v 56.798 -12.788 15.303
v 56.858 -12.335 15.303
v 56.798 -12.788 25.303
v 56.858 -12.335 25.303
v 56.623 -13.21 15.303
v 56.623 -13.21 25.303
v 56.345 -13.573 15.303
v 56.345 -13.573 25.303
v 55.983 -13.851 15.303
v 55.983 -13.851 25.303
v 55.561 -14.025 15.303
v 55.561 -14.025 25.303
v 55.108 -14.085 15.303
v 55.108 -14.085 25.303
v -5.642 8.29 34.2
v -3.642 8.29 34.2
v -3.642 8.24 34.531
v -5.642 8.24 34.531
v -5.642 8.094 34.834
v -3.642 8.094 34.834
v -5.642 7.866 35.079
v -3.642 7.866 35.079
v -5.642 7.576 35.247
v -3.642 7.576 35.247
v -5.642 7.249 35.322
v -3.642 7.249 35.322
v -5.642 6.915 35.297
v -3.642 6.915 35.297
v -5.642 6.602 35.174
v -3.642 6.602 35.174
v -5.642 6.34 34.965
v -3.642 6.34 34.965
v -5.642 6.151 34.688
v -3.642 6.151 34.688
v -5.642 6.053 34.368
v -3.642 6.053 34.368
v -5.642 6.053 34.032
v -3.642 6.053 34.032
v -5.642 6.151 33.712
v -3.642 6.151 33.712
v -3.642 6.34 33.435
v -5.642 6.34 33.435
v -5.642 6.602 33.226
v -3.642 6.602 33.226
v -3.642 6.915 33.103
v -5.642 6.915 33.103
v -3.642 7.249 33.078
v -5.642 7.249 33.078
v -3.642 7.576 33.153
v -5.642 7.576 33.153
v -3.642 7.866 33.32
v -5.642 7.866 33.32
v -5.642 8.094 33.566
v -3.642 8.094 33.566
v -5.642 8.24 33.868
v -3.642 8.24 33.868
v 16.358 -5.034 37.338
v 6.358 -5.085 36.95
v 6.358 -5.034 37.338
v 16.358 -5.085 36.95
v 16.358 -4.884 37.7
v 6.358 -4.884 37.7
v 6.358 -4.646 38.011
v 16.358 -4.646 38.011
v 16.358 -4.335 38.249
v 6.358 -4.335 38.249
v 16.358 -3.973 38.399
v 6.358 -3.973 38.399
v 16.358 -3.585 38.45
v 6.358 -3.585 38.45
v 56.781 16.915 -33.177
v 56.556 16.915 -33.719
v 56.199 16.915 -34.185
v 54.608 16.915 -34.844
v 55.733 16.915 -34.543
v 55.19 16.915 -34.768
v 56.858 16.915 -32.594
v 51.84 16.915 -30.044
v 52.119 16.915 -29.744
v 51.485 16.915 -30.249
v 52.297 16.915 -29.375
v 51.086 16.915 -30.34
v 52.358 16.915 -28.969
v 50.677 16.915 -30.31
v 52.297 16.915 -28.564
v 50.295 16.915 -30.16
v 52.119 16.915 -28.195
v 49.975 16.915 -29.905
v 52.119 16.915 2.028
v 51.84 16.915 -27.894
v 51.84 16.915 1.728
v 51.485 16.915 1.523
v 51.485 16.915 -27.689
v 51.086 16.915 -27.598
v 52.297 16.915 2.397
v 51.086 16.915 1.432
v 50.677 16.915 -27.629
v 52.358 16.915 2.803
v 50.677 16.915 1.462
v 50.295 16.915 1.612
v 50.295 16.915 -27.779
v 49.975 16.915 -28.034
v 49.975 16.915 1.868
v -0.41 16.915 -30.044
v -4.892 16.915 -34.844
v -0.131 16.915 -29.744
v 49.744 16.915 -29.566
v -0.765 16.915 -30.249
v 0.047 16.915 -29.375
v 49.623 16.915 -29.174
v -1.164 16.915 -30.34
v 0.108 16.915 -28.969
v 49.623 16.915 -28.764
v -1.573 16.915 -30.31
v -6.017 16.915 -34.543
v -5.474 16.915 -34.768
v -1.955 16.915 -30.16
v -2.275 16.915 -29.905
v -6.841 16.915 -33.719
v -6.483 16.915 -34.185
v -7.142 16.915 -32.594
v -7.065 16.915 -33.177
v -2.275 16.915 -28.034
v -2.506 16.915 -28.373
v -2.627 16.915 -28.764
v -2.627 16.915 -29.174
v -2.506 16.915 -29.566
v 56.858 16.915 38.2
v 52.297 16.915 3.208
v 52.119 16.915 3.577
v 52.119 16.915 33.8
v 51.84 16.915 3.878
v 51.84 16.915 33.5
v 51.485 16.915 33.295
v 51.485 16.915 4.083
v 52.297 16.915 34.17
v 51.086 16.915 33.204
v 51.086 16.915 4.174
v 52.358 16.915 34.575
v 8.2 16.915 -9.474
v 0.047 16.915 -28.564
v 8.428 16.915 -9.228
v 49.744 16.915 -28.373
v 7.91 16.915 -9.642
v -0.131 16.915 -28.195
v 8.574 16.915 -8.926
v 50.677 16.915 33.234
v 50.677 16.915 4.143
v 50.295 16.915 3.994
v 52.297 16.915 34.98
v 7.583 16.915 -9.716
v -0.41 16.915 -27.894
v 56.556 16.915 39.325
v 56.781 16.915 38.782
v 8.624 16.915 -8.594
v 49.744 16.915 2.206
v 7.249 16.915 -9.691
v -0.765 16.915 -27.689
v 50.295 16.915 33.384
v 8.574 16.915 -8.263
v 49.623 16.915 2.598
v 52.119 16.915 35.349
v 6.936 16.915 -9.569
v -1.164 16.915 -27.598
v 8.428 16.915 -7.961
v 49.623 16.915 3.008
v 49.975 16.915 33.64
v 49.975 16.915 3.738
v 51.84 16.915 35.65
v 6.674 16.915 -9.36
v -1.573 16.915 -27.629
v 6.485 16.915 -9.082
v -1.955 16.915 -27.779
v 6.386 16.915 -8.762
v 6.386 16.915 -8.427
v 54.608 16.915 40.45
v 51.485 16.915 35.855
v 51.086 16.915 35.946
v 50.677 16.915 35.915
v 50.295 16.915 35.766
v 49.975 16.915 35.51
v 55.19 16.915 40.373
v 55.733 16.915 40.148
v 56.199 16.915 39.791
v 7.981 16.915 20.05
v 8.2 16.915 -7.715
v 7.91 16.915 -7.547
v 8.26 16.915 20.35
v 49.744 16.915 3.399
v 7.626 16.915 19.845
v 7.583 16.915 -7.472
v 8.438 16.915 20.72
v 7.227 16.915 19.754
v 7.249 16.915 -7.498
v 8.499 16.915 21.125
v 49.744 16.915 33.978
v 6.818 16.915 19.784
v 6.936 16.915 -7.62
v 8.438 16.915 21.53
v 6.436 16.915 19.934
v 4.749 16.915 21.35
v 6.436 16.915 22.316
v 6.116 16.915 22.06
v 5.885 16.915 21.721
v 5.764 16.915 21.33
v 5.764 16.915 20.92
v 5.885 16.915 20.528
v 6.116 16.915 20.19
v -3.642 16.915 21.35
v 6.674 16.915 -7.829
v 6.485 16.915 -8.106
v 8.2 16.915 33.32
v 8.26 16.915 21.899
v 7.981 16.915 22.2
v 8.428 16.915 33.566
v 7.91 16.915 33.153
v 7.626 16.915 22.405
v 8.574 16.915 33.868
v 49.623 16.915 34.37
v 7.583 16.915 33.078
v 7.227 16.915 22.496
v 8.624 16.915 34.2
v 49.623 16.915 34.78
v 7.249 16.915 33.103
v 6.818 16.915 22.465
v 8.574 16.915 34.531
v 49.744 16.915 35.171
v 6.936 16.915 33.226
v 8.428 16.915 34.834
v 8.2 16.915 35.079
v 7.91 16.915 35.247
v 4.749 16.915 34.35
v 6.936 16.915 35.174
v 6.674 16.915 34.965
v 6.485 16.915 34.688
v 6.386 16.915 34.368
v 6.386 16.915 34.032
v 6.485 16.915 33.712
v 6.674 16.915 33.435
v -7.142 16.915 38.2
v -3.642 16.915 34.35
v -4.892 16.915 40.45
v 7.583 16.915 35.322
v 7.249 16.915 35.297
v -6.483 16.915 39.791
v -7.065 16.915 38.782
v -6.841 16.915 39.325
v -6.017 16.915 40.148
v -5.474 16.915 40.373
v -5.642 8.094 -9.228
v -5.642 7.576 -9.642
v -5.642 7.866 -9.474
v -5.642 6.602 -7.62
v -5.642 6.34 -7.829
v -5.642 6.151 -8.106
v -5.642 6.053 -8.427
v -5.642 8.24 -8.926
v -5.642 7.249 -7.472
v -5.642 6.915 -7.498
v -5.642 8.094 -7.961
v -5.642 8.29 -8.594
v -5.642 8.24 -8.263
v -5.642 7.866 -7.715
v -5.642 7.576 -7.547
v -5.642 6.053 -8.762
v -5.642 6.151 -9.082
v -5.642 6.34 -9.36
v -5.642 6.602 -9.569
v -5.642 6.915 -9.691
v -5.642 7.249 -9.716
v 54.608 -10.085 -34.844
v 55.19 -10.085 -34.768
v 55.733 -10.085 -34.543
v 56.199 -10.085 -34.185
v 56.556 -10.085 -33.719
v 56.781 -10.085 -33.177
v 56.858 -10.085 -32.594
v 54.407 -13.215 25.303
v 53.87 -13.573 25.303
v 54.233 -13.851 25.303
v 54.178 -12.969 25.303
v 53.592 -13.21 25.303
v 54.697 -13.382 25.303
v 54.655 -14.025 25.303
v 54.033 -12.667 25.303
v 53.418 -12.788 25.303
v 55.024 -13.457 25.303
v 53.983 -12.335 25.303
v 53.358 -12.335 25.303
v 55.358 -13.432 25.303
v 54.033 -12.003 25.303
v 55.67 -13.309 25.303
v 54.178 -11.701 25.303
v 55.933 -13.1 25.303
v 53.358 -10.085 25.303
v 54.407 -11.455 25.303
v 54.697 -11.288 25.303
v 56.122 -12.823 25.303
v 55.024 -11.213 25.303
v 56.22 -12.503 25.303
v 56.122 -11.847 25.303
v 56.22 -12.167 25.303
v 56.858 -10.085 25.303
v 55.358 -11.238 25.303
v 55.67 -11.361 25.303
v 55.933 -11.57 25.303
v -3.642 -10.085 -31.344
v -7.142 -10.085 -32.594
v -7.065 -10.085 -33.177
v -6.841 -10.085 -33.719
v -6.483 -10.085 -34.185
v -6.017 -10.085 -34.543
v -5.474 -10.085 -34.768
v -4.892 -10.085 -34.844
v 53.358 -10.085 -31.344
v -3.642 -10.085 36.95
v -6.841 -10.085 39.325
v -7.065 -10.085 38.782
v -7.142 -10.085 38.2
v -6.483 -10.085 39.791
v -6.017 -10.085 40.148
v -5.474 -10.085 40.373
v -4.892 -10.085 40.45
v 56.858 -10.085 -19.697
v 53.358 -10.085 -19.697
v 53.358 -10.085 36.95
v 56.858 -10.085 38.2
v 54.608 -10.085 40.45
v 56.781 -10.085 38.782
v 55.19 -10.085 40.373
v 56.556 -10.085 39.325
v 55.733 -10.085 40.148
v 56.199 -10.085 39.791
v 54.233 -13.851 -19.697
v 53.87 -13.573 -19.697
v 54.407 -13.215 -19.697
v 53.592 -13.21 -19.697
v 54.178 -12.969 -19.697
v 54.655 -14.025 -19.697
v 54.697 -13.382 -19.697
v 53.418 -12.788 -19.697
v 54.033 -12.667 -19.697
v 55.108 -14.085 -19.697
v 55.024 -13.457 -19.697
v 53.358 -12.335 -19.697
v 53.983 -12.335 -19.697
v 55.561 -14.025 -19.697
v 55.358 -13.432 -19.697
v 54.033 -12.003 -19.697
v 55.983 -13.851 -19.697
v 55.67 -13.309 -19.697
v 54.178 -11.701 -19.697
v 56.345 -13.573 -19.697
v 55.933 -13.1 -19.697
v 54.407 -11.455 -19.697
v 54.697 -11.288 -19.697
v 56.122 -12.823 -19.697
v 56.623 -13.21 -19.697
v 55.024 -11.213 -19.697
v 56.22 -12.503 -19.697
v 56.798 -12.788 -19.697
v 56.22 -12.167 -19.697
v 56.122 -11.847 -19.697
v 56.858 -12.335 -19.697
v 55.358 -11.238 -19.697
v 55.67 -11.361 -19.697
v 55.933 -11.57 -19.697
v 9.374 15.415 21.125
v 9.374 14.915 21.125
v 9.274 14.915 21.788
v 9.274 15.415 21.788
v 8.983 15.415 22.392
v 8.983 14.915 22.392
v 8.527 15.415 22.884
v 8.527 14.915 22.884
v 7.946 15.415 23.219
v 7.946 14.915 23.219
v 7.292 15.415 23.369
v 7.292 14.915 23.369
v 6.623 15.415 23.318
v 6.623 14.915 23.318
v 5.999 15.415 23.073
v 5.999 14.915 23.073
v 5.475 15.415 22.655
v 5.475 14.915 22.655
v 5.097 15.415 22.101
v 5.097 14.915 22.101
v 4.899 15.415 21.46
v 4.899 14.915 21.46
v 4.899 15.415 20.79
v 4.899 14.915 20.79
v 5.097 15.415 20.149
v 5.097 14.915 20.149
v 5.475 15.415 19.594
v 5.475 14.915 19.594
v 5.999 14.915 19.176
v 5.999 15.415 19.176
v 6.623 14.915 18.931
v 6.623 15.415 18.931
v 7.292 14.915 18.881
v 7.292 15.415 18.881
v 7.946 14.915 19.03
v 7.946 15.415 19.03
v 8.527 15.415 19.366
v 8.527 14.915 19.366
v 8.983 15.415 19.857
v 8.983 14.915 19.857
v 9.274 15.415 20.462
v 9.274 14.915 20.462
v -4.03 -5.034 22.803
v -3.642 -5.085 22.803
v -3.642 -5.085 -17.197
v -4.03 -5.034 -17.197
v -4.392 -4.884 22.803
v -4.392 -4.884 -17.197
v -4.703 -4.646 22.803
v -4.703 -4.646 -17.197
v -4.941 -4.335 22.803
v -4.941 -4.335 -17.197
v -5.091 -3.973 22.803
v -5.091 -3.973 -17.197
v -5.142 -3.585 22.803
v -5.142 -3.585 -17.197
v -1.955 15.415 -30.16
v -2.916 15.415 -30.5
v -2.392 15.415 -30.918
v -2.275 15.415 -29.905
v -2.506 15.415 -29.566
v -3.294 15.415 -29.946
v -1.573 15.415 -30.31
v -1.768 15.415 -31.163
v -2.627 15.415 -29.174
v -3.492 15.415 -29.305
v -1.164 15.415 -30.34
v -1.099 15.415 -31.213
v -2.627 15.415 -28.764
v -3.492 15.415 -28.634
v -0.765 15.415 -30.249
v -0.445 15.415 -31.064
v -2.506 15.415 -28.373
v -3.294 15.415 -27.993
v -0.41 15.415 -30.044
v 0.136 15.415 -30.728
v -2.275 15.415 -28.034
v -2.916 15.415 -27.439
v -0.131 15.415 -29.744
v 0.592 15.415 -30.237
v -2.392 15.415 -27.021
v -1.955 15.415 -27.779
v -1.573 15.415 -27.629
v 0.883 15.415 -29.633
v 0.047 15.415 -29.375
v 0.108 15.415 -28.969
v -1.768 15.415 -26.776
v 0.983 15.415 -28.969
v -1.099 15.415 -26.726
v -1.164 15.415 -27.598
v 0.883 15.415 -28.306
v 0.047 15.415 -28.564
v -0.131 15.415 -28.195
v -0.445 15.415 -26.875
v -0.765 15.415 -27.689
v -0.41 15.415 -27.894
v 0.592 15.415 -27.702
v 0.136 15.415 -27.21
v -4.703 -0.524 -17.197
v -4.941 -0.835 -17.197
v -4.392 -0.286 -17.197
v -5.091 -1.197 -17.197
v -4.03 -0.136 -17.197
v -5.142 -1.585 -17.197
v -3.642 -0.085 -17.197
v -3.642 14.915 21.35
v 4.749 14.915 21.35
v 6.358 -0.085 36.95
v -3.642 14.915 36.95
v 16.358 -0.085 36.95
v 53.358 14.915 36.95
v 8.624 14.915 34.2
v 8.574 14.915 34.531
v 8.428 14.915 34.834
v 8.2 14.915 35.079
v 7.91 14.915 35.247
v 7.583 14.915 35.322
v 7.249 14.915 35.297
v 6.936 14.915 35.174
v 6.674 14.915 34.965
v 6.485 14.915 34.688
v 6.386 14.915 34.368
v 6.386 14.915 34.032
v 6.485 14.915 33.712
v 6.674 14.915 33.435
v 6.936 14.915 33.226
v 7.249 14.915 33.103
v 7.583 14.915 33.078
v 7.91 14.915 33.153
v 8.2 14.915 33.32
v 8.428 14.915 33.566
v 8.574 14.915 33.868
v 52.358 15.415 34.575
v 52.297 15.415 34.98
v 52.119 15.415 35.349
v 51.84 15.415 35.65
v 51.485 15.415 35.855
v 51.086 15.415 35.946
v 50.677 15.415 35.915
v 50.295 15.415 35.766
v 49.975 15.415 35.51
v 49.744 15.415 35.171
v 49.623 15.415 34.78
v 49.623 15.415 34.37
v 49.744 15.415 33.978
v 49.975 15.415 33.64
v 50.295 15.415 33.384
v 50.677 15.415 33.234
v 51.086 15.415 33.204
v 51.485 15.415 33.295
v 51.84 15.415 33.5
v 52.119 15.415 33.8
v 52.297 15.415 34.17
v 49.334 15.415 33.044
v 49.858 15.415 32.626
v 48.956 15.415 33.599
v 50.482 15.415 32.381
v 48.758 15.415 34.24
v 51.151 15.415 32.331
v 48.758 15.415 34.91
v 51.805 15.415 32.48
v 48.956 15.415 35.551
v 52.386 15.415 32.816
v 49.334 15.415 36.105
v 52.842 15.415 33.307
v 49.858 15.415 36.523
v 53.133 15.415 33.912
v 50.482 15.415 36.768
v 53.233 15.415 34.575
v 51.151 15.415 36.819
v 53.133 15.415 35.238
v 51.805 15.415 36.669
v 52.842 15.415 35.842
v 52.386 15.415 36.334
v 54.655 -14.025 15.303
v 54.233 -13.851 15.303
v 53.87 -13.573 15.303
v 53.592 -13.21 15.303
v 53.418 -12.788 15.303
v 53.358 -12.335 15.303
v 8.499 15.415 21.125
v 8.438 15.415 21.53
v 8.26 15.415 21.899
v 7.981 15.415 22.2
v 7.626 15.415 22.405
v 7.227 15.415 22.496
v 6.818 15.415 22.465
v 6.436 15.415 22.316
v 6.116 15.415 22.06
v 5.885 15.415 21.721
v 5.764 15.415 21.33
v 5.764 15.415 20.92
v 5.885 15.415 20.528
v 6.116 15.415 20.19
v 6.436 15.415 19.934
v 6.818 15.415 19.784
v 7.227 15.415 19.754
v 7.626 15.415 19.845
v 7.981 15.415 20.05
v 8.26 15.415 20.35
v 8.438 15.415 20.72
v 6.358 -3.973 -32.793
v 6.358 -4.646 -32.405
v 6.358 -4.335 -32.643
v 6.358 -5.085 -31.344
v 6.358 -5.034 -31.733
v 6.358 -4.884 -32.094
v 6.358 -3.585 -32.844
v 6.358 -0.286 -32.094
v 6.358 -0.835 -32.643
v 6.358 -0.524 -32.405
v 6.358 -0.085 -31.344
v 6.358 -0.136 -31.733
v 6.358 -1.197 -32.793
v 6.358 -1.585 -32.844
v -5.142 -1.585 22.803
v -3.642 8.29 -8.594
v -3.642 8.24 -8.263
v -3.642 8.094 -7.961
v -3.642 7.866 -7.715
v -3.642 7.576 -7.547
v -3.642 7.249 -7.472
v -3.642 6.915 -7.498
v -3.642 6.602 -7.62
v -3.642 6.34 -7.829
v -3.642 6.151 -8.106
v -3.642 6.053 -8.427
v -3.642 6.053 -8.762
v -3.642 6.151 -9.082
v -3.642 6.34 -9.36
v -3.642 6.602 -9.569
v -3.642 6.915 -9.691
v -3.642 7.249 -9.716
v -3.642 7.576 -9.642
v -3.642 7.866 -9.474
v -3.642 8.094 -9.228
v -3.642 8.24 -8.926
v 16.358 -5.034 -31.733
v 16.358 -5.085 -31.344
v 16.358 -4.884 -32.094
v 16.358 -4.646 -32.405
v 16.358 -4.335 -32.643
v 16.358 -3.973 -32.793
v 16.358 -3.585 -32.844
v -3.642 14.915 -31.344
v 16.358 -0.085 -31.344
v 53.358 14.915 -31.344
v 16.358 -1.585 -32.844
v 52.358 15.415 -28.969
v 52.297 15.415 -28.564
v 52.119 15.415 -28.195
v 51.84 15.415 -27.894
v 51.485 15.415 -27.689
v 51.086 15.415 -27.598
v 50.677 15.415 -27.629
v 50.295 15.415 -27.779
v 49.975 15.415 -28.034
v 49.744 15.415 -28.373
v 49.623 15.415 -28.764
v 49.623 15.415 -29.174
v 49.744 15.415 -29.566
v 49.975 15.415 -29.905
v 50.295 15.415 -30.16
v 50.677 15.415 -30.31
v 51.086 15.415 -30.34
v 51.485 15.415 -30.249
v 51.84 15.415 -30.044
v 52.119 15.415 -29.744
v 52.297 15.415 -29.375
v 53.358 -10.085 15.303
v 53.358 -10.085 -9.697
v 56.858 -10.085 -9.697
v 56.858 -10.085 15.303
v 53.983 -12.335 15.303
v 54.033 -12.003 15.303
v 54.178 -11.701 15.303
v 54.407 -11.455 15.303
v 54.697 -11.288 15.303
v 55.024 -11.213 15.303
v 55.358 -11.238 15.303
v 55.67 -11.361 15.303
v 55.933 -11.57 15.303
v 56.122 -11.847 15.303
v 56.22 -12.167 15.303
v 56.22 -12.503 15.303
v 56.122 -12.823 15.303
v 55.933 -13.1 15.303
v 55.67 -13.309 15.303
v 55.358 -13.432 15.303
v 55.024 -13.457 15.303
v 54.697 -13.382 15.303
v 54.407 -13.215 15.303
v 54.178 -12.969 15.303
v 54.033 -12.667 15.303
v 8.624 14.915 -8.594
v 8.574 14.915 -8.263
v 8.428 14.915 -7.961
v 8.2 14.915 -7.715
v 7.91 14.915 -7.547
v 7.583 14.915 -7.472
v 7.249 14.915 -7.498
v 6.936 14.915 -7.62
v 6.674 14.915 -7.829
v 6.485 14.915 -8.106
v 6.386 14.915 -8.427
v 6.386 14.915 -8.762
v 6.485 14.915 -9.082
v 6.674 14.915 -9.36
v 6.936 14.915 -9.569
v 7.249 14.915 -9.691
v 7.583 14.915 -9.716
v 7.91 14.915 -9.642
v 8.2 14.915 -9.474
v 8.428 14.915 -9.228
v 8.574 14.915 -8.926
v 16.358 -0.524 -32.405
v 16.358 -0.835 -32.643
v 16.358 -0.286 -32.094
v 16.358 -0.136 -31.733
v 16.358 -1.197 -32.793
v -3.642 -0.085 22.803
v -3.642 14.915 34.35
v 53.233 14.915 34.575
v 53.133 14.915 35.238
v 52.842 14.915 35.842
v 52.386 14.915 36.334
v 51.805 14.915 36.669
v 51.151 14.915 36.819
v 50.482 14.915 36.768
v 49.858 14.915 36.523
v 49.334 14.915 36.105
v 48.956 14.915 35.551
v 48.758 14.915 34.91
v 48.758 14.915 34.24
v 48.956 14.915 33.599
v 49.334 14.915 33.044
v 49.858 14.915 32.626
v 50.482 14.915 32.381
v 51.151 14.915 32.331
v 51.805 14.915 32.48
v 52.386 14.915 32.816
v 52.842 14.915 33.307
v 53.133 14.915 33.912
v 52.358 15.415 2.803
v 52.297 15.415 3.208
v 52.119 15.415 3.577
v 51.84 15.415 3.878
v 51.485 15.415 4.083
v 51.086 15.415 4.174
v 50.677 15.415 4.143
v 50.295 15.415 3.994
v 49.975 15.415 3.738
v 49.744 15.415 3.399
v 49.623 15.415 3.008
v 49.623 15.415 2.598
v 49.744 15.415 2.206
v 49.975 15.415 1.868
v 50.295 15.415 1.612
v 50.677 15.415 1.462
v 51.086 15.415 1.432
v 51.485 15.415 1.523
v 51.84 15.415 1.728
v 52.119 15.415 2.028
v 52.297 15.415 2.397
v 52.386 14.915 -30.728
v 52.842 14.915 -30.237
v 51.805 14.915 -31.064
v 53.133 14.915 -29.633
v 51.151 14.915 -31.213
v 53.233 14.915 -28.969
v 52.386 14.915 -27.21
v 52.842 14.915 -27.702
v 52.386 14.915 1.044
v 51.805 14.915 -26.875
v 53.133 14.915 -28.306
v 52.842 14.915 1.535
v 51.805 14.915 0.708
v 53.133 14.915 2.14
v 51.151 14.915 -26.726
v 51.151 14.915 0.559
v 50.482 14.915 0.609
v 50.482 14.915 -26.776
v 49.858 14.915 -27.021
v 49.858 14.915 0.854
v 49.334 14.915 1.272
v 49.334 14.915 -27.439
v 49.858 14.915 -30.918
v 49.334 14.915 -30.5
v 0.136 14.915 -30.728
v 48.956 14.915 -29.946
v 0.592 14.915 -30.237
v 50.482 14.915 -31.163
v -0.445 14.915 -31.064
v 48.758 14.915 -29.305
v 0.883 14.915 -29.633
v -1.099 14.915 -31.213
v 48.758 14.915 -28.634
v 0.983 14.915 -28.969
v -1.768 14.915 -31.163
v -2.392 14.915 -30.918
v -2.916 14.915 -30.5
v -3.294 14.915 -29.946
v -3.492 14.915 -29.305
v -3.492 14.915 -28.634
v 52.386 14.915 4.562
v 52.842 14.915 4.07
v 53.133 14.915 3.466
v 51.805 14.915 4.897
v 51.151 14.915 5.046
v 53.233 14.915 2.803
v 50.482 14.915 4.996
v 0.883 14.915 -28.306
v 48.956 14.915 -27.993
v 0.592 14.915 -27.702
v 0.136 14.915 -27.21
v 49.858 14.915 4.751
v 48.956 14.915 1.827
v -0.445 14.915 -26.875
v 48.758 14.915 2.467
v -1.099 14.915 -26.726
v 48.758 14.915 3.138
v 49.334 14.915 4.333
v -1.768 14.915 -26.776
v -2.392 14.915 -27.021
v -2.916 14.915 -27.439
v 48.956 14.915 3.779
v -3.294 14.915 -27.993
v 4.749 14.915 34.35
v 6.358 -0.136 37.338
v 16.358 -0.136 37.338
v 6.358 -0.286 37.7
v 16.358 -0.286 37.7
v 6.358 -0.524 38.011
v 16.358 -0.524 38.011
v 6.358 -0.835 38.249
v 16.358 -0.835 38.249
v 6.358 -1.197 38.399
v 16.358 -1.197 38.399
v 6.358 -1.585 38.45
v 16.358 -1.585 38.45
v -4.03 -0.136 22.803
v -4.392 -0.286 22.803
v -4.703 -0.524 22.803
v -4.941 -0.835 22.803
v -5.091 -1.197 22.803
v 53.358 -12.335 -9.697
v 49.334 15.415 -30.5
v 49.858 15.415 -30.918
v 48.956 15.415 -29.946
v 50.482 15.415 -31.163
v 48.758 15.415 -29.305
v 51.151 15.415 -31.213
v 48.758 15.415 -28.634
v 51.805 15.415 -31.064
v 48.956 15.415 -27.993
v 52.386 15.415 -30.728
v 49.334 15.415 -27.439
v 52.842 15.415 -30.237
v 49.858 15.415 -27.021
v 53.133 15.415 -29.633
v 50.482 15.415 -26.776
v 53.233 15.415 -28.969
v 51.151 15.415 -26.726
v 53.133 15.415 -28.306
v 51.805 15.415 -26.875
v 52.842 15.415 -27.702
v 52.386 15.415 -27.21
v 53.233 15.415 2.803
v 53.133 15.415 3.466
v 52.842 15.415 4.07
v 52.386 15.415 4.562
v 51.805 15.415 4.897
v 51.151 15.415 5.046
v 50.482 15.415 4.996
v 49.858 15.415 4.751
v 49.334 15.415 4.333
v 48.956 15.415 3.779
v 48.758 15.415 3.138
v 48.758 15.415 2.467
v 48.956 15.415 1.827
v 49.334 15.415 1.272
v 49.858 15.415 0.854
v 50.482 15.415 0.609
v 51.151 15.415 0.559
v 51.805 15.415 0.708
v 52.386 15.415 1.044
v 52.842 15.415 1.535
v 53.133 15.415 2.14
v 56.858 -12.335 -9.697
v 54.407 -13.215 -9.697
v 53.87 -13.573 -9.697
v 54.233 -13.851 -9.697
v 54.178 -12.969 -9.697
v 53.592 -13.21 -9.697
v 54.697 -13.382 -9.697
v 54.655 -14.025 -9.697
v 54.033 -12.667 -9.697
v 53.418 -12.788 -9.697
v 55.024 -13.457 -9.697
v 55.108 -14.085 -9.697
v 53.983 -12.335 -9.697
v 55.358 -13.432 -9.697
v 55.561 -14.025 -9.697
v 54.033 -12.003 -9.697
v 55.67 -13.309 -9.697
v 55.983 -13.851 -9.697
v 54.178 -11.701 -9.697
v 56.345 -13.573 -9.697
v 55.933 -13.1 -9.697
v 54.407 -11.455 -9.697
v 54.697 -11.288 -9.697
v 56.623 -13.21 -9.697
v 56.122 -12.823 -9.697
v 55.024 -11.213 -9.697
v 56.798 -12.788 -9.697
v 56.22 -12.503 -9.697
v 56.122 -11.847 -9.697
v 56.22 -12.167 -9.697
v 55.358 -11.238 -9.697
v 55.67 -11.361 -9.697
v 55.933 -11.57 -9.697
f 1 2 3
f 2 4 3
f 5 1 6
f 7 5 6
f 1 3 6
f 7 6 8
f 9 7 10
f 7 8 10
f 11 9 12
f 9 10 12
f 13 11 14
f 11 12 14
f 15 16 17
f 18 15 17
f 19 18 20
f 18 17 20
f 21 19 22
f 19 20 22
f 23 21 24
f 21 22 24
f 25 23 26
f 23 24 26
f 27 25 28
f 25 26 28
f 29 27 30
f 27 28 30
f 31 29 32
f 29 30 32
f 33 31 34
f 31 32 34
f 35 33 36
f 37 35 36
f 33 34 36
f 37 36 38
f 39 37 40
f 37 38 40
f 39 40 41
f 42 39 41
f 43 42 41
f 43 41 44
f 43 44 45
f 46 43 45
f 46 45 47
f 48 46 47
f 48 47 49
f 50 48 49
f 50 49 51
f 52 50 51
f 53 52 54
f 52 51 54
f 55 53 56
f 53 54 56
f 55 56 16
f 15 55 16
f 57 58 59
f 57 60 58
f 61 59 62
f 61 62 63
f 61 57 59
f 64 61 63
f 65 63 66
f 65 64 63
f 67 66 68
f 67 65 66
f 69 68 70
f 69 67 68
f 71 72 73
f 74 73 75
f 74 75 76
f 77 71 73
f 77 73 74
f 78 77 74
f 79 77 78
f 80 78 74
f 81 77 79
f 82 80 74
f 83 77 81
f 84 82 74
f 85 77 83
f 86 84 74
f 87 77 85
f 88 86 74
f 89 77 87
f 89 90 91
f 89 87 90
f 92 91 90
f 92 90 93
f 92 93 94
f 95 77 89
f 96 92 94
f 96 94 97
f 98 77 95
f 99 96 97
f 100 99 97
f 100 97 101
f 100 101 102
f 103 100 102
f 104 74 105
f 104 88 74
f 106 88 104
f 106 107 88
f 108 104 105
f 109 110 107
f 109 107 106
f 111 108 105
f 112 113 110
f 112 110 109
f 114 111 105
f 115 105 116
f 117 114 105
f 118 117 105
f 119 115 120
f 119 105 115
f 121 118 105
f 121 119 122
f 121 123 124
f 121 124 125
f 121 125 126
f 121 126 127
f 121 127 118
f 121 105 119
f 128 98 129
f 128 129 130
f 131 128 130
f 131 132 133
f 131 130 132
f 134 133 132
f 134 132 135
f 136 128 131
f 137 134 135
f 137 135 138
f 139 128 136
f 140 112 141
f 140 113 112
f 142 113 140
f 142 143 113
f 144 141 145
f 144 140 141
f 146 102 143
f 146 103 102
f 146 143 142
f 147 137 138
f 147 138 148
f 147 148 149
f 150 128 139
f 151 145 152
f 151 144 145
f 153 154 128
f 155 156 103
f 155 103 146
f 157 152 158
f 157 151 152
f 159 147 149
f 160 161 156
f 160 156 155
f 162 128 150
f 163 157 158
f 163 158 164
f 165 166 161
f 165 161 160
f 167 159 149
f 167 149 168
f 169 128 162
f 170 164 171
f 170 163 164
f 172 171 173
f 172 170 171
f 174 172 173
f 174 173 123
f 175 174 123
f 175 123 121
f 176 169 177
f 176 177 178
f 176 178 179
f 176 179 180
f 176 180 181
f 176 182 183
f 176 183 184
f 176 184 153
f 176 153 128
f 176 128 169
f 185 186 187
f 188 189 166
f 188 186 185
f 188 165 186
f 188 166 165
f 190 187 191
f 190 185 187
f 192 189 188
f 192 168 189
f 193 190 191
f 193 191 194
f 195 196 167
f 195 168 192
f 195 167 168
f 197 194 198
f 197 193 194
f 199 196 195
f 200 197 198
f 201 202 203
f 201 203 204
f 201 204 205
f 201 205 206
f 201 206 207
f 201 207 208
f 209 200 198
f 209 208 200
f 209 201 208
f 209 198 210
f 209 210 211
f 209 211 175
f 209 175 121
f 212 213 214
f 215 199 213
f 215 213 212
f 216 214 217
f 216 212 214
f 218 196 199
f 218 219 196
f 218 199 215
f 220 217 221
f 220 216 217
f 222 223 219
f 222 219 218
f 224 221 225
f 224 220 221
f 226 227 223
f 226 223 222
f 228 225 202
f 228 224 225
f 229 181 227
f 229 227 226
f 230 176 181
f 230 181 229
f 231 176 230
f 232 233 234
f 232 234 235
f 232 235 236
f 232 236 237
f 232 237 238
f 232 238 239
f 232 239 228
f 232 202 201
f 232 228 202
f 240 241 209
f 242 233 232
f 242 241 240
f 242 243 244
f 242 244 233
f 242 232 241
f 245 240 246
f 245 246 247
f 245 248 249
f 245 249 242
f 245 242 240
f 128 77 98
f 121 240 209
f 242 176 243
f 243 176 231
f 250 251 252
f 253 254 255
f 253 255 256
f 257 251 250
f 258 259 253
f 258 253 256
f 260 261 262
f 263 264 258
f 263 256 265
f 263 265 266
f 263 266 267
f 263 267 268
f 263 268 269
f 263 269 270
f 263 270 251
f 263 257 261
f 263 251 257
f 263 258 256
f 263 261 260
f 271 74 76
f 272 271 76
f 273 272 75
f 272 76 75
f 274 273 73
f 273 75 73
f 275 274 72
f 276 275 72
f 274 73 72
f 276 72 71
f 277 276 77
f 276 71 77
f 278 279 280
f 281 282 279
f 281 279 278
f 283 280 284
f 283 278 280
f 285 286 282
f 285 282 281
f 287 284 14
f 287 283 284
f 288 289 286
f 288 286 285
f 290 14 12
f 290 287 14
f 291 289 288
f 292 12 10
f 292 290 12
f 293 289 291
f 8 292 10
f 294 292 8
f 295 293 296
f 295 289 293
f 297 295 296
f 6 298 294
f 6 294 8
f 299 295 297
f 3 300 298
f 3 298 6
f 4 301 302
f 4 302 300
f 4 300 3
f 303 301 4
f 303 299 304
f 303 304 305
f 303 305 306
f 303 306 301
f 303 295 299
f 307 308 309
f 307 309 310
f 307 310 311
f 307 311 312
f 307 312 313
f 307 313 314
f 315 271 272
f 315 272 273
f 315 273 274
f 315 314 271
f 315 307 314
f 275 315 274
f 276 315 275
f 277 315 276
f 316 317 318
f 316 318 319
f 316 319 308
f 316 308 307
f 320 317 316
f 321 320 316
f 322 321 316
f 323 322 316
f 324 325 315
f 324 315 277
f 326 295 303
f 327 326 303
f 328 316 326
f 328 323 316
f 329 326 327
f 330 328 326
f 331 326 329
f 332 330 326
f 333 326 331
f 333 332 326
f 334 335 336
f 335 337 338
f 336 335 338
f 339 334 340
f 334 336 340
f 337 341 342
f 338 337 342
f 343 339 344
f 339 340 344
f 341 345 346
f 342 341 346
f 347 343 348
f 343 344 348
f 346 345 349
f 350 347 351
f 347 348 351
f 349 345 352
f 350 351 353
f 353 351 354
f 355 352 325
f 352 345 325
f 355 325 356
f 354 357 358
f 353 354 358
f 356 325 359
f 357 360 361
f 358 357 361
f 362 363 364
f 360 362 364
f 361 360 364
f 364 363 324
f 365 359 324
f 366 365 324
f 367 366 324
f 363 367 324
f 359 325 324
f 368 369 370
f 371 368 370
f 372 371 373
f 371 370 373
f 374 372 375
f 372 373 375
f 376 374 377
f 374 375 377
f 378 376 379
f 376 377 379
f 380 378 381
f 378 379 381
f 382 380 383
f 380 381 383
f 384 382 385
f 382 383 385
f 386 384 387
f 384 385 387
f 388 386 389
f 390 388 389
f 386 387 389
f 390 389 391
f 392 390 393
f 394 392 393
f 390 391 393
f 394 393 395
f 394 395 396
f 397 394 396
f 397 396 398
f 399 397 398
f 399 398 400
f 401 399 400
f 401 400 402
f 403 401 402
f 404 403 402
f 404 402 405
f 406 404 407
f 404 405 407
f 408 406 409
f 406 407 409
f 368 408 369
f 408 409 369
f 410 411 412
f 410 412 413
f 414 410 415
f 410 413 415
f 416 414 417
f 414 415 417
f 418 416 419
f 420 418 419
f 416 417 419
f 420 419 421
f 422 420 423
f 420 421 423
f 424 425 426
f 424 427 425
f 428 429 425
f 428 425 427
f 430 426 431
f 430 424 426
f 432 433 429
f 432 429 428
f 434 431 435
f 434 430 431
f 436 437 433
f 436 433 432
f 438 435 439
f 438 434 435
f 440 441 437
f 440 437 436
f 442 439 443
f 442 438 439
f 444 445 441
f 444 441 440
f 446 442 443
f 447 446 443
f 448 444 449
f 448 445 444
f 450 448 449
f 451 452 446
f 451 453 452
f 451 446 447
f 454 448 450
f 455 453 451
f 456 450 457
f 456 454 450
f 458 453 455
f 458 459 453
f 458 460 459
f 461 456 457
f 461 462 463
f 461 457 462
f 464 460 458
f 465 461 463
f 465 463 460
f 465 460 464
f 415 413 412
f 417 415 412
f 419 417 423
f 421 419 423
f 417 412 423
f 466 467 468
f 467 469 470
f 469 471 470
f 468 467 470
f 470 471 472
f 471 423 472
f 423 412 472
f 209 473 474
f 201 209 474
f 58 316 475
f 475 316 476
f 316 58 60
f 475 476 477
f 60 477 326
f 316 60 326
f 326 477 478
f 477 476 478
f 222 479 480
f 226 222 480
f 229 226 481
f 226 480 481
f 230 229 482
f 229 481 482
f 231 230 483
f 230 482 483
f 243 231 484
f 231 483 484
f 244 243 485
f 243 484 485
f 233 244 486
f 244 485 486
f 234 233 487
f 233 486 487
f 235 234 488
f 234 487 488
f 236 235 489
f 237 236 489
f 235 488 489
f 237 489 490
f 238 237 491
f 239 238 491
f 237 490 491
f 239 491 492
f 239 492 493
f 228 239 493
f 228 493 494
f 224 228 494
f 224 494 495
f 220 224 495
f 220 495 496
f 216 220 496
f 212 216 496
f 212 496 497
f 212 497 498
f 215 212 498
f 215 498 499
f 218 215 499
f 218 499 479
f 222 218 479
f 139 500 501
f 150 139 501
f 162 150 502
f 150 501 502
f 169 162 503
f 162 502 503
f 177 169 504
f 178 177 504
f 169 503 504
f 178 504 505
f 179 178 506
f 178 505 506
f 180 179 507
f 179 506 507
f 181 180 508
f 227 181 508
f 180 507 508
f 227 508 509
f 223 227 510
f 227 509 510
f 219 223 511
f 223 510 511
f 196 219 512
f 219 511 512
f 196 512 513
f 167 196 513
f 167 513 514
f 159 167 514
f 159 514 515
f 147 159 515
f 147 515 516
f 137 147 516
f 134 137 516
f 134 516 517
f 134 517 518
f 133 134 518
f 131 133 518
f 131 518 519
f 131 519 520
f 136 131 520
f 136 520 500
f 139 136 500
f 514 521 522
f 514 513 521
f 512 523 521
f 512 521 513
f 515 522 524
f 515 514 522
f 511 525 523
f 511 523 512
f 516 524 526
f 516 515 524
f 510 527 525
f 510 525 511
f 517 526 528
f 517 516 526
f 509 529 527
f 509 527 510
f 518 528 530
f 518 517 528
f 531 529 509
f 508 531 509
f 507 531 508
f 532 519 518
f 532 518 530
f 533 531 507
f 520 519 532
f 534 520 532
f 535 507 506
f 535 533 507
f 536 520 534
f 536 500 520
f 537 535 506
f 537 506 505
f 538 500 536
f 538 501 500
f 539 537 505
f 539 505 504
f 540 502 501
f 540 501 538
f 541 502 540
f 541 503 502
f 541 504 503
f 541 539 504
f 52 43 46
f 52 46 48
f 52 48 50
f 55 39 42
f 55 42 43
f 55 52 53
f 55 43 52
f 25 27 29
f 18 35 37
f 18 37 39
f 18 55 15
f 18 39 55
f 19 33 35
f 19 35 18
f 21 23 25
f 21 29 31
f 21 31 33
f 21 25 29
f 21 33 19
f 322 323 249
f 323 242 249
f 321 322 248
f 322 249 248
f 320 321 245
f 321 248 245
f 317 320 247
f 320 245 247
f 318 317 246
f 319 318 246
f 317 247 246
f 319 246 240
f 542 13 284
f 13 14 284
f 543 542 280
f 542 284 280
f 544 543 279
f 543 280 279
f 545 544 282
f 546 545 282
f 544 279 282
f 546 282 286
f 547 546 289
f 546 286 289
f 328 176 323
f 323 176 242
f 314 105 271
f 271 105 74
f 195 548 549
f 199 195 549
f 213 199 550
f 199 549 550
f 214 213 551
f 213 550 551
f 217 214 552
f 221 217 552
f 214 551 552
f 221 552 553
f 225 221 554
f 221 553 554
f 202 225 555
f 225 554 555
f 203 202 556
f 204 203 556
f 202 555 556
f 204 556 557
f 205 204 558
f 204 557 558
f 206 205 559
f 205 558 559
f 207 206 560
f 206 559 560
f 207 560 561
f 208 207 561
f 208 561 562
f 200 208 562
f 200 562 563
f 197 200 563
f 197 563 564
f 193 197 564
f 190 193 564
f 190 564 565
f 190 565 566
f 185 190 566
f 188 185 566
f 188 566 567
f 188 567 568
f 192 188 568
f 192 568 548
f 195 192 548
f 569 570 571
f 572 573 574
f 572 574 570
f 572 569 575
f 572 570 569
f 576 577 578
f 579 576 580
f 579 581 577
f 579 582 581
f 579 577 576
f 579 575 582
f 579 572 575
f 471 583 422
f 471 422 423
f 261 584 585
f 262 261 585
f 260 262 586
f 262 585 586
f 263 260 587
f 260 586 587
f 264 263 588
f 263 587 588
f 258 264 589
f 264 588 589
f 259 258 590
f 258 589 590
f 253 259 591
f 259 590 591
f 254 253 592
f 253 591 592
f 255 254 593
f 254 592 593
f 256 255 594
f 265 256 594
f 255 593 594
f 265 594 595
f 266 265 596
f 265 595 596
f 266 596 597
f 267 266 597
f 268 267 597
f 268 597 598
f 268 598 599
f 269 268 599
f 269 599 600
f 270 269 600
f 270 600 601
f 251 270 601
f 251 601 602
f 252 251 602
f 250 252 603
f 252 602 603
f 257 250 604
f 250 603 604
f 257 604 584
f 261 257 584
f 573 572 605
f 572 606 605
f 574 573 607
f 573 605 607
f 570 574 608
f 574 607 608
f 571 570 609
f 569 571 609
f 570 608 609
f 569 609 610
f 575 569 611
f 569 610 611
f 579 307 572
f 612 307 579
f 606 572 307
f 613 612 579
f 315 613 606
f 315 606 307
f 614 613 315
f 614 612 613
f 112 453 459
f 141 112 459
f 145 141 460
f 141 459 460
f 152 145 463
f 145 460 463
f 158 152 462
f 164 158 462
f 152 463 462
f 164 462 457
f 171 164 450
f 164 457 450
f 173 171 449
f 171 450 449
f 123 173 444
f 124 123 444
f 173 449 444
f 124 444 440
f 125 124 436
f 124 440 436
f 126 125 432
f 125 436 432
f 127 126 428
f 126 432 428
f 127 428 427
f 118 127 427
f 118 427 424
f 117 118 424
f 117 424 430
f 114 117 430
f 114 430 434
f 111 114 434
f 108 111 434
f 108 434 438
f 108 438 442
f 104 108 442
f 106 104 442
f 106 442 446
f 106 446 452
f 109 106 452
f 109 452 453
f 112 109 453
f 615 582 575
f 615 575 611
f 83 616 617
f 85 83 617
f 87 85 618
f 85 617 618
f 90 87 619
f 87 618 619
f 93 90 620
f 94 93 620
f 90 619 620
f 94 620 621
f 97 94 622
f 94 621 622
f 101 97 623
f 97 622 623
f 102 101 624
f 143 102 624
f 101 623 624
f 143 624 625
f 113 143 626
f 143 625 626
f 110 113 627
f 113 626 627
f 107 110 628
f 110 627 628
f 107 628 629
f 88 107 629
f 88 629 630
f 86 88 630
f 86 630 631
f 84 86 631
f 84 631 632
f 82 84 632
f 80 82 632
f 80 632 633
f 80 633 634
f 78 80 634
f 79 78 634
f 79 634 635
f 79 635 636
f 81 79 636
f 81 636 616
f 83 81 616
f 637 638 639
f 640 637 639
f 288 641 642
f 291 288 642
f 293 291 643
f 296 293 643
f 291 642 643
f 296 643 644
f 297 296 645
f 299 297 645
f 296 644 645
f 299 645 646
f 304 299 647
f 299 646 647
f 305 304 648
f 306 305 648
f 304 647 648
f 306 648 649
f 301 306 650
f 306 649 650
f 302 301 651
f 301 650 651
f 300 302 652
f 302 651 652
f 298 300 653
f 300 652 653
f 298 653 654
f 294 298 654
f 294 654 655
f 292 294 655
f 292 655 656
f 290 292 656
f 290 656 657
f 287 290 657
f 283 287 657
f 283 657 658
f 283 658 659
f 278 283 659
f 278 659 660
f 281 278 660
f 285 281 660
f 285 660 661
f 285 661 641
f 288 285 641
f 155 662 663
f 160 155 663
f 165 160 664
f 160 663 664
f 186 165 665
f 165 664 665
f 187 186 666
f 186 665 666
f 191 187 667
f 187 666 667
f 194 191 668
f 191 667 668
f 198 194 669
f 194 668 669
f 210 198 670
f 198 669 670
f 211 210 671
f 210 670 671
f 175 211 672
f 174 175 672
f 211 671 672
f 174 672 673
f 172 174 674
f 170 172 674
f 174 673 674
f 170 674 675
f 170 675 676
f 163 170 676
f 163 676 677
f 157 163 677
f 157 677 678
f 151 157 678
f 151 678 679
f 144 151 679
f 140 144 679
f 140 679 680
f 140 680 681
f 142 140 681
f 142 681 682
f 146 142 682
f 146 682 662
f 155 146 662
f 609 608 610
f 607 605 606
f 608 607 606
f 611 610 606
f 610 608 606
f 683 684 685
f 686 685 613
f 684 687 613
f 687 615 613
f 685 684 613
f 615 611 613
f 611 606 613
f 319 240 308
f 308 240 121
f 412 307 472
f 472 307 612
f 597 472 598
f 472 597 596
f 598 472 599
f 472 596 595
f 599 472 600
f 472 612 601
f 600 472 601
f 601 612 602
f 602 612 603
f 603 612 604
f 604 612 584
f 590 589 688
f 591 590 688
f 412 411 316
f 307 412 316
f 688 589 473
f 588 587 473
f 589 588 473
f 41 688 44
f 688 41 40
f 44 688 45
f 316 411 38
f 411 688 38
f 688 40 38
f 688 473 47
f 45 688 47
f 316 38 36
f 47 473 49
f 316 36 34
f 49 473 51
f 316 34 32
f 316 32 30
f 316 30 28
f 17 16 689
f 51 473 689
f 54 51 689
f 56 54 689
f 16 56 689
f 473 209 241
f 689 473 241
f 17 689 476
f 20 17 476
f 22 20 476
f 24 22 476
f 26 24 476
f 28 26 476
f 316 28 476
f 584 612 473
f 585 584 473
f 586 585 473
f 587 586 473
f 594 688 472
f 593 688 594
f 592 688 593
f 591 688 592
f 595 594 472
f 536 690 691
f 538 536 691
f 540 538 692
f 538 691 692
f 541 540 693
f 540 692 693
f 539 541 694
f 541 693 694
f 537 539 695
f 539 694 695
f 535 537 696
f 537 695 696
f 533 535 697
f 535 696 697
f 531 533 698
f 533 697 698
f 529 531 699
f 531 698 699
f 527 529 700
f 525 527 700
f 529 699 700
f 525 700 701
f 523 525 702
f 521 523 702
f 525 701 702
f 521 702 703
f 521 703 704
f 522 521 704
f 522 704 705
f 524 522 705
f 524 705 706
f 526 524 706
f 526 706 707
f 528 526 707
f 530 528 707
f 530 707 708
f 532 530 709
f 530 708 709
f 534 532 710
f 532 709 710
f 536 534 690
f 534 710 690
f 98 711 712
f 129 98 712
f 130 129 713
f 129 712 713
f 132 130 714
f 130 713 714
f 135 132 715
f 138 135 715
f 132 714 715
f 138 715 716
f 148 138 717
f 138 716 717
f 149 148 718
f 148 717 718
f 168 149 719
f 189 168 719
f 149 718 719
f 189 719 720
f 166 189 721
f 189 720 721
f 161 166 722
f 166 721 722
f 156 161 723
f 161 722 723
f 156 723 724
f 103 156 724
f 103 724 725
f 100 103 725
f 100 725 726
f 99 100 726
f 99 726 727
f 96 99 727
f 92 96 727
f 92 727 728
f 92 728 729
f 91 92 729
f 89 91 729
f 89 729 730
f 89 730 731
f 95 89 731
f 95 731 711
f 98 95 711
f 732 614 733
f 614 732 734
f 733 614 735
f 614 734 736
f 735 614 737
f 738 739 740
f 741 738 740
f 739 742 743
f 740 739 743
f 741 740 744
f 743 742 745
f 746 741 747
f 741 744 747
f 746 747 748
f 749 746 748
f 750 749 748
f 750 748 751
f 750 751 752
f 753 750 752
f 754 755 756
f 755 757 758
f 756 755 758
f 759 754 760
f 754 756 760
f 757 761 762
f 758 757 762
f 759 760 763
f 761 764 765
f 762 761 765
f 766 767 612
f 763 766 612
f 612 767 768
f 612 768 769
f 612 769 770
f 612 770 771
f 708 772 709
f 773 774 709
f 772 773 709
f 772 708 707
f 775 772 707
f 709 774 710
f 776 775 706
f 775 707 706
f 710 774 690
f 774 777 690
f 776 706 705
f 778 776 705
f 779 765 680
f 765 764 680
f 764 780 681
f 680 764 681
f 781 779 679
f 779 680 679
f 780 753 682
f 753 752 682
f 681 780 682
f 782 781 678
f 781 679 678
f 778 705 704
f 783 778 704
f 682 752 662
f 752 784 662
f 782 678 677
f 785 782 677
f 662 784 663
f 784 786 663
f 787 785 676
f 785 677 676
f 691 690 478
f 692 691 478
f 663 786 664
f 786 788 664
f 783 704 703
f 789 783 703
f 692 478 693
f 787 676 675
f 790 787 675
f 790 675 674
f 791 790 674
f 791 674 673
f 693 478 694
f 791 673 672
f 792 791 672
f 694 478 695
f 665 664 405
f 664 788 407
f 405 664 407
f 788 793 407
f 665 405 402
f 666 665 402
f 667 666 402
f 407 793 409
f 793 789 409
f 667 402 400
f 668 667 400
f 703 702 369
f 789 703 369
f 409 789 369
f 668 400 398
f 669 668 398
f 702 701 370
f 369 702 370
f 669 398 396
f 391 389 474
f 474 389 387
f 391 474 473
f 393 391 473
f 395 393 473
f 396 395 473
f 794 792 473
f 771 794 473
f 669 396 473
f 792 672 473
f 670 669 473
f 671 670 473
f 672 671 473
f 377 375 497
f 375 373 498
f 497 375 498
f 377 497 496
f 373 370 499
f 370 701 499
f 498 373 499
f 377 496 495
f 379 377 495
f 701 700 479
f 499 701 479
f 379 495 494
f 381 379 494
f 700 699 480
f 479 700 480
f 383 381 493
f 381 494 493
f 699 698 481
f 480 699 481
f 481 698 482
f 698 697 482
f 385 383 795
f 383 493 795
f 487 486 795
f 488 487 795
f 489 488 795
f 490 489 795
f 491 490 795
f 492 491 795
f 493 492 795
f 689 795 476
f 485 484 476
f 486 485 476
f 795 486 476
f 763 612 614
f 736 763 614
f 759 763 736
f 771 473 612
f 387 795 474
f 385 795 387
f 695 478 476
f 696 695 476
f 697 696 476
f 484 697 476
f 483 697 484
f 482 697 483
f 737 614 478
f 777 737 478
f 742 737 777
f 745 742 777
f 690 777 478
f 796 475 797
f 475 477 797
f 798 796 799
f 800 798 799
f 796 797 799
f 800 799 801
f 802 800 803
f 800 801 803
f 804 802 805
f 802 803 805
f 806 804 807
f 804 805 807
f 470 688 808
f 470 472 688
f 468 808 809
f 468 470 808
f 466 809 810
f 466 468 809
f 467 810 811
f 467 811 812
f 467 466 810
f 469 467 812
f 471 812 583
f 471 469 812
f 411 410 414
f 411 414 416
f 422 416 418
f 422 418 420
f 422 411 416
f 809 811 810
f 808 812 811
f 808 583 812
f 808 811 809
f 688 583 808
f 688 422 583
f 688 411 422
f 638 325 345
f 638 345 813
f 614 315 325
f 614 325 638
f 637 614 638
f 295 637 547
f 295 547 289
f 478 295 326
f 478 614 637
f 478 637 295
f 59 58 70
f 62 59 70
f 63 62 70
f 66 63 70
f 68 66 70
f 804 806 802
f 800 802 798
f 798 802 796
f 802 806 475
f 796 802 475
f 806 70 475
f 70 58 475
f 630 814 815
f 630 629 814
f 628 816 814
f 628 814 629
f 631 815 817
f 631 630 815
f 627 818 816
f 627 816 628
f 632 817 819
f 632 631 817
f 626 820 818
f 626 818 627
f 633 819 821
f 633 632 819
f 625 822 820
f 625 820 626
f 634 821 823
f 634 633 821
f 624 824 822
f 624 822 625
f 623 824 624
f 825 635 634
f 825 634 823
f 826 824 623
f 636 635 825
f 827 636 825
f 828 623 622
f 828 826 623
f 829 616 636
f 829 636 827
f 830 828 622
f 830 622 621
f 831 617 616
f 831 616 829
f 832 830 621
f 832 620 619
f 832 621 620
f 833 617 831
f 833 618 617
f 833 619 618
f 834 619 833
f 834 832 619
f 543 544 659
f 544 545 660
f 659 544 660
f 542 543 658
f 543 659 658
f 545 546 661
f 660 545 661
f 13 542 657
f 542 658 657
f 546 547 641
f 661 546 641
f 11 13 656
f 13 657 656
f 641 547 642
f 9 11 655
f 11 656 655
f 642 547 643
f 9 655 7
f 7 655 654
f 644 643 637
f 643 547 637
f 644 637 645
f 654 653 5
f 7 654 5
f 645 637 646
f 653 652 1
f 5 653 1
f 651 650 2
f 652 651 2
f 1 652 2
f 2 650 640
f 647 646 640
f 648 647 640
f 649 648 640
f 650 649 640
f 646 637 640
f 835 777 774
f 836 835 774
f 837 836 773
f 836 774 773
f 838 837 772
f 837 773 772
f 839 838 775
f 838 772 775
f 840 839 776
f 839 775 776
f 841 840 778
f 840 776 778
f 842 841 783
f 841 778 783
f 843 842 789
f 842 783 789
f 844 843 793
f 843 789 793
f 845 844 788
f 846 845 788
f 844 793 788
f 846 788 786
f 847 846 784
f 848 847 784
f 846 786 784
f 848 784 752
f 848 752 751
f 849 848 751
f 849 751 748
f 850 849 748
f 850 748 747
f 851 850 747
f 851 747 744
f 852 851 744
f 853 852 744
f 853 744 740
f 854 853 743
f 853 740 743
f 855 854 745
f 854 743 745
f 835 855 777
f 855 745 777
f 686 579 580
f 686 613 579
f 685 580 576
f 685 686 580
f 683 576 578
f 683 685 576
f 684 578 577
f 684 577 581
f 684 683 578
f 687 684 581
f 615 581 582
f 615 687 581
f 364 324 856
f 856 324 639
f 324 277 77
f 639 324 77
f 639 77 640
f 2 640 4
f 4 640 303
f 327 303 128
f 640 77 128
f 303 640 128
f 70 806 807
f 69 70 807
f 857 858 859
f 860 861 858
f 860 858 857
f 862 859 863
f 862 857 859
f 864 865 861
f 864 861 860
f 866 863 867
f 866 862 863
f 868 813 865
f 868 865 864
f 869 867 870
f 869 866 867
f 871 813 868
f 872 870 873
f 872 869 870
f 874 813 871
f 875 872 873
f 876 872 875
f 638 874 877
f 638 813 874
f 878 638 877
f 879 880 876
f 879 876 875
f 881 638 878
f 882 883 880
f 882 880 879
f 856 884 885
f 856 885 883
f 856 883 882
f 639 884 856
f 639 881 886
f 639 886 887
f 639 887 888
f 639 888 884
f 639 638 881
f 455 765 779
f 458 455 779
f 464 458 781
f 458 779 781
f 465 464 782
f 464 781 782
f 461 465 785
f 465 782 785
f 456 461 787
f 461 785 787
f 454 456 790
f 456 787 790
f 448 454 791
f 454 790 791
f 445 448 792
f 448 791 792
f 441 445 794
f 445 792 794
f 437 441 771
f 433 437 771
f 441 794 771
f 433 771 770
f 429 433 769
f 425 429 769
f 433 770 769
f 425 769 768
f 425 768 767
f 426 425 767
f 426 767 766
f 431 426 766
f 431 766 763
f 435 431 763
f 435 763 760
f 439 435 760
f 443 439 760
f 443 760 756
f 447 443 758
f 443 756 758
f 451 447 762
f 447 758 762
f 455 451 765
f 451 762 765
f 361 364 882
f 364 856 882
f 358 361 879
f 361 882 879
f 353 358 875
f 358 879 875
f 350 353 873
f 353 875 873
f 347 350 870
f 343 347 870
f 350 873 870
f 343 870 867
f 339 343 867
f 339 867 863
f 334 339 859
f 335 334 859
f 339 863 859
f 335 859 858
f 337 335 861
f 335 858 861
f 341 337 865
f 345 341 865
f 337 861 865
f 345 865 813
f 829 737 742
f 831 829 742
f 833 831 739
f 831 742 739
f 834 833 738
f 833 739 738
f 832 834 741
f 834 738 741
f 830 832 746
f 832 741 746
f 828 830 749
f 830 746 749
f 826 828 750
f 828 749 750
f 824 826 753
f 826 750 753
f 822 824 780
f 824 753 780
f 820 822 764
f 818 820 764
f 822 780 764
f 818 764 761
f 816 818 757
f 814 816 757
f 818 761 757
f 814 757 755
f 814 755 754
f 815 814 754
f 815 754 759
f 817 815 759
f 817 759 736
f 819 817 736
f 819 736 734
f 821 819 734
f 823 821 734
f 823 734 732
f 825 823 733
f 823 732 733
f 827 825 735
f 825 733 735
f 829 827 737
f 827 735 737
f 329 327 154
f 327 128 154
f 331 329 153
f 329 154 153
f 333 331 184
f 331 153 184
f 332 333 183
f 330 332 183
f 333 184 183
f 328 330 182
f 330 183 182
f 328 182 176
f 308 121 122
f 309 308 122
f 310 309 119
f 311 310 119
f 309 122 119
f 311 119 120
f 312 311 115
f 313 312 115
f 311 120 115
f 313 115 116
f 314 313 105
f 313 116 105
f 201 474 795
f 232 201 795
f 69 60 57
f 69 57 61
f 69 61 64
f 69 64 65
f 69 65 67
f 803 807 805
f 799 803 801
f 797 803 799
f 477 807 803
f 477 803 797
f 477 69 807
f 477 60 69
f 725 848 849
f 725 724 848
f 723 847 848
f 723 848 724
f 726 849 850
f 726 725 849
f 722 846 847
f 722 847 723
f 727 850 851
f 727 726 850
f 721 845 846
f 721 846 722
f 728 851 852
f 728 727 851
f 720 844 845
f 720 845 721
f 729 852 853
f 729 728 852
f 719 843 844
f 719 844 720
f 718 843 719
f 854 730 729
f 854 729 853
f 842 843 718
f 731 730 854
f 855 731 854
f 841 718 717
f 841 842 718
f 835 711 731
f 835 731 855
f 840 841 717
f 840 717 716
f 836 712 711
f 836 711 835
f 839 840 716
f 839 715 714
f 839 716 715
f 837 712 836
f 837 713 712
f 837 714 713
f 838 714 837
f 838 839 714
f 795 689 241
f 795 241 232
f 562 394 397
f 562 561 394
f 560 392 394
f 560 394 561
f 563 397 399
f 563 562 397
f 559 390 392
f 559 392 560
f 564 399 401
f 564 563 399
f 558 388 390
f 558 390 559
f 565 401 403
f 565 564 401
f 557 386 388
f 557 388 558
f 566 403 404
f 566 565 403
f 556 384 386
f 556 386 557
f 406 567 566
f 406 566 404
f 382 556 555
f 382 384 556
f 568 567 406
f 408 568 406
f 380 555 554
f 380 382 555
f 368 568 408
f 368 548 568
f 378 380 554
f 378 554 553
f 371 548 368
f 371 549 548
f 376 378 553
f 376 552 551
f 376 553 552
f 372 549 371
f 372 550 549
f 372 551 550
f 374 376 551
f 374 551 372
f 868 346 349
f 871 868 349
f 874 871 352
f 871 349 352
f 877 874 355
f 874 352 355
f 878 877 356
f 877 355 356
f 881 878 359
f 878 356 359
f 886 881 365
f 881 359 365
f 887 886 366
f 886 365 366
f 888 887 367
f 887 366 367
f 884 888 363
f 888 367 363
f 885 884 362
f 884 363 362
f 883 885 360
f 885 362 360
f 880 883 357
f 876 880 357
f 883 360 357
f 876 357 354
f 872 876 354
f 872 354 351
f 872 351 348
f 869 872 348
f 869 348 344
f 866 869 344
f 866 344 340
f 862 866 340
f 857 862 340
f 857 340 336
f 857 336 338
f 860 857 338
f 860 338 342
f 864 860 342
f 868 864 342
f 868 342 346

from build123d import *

# Parameters (mm, degrees)
EXTRUDE_BASE_DEPTH              = 2
SKETCH2_W                       = 57
SKETCH2_H                       = 68.2942
EXTRUDE_WALLS_DEPTH             = 25
SKETCH3_W                       = 8.390953786
SKETCH3_H                       = 13
CUT_USB_HOLE_DEPTH              = 75.121635616
SKETCH4_R                       = 1.375
CUT_CONNECTING_THRU_HOLES_DEPTH = 75.121635616
SKETCH5_R                       = 2.25
SKETCH5_R_2                     = 1.375
CUT_EXTRUDE3_DEPTH              = 0.5
SKETCH6_R                       = 1.125
CUT_CABLE_COVER_BOTTOM_DEPTH    = 75.121635616
SKETCH7_R                       = 1.125
CUT_CABLE_COVER_SIDE_DEPTH      = 2
SKETCH8_W                       = 3.5
SKETCH8_H                       = 10
EXTRUDE_HINGE_DEPTH             = 4
SKETCH9_R                       = 1.125
CUT_HINGE_HOLE_DEPTH            = 85.478484791
FILLET_HINGE_R                  = 1.75
SKETCH10_W                      = 40
SKETCH10_H                      = 5
CUT_NOTCH_DEPTH                 = 1.5
SKETCH11_W                      = 10
SKETCH11_H                      = 5
CUT_SIDE_NOTCH_DEPTH            = 1.5
FILLET_NOTCH_R                  = 1.5


with BuildPart() as part:
    # Sketch1 → Extrude Base (new body)
    with BuildSketch(Plane.XZ.offset(-16.914945084)):
        with BuildLine():
            Line((56.857940404, 38.199863775), (56.857940404, -32.594336225))
            ThreePointArc((56.857940404, -32.594336225), (56.198930662, -34.185326483), (54.607940404, -34.844336225))
            Line((54.607940404, -34.844336225), (-4.892059596, -34.844336225))
            ThreePointArc((-4.892059596, -34.844336225), (-6.483049854, -34.185326483), (-7.142059596, -32.594336225))
            Line((-7.142059596, -32.594336225), (-7.142059596, 38.199863775))
            ThreePointArc((-7.142059596, 38.199863775), (-6.483049854, 39.790854032), (-4.892059596, 40.449863775))
            Line((-4.892059596, 40.449863775), (54.607940404, 40.449863775))
            ThreePointArc((54.607940404, 40.449863775), (56.198930662, 39.790854032), (56.857940404, 38.199863775))
        make_face()
    extrude(amount=EXTRUDE_BASE_DEPTH)

    # Sketch2 → Extrude Walls (add)
    with BuildSketch(Plane.XZ.offset(-14.914945084)):
        with BuildLine():
            Line((56.857940404, -32.594336225), (56.857940404, 38.199863775))
            ThreePointArc((56.857940404, 38.199863775), (56.198930662, 39.790854032), (54.607940404, 40.449863775))
            Line((54.607940404, 40.449863775), (-4.892059596, 40.449863775))
            ThreePointArc((-4.892059596, 40.449863775), (-6.483049854, 39.790854032), (-7.142059596, 38.199863775))
            Line((-7.142059596, 38.199863775), (-7.142059596, -32.594336225))
            ThreePointArc((-7.142059596, -32.594336225), (-6.483049854, -34.185326483), (-4.892059596, -34.844336225))
            Line((-4.892059596, -34.844336225), (54.607940404, -34.844336225))
            ThreePointArc((54.607940404, -34.844336225), (56.198930662, -34.185326483), (56.857940404, -32.594336225))
        make_face()
        with Locations((24.857940404, 2.802763775)):
            Rectangle(SKETCH2_W, SKETCH2_H, mode=Mode.SUBTRACT)
    extrude(amount=EXTRUDE_WALLS_DEPTH)

    # Sketch3 → Cut USB Hole (cut, through all)
    with BuildSketch(Plane.XZ.offset(-14.914945084)):
        with Locations((0.553417297, 27.849863775)):
            Rectangle(SKETCH3_W, SKETCH3_H)
    extrude(amount=-CUT_USB_HOLE_DEPTH, mode=Mode.SUBTRACT)

    # Sketch4 → Cut Connecting Thru Holes (cut, through all)
    with BuildSketch(Plane.XZ.offset(-14.914945084)):
        with Locations((50.982940404, 34.574863775)):
            Circle(SKETCH4_R)
        with Locations((50.982940404, -28.969336225)):
            Circle(SKETCH4_R)
        with Locations((-1.267059596, -28.969336225)):
            Circle(SKETCH4_R)
        with Locations((50.982940404, 2.802763775)):
            Circle(SKETCH4_R)
        with Locations((7.12389419, 21.124863775)):
            Circle(SKETCH4_R)
    extrude(amount=-CUT_CONNECTING_THRU_HOLES_DEPTH, mode=Mode.SUBTRACT)

    # Sketch5 → Cut-Extrude3 (cut)
    # profile 1 of 5: a face of its own
    with BuildSketch(Plane.XZ.offset(-14.914945084)):
        with Locations((7.12389419, 21.124863775)):
            Circle(SKETCH5_R)
        with Locations((7.12389419, 21.124863775)):
            Circle(SKETCH5_R_2, mode=Mode.SUBTRACT)
    # profile 2 of 5: a face of its own
    with BuildSketch(Plane.XZ.offset(-14.914945084)):
        with Locations((50.982940404, 34.574863775)):
            Circle(SKETCH5_R)
    # profile 3 of 5: a face of its own
    with BuildSketch(Plane.XZ.offset(-14.914945084)):
        with Locations((50.982940404, 2.802763775)):
            Circle(SKETCH5_R)
    # profile 4 of 5: a face of its own
    with BuildSketch(Plane.XZ.offset(-14.914945084)):
        with Locations((50.982940404, -28.969336225)):
            Circle(SKETCH5_R)
    # profile 5 of 5: a face of its own
    with BuildSketch(Plane.XZ.offset(-14.914945084)):
        with Locations((-1.267059596, -28.969336225)):
            Circle(SKETCH5_R)
    extrude(amount=-CUT_EXTRUDE3_DEPTH, mode=Mode.SUBTRACT)

    # Sketch6 → Cut Cable Cover Bottom (cut, through all)
    with BuildSketch(Plane.XZ.offset(-14.914945084)):
        with Locations((7.49889419, 34.199863775)):
            Circle(SKETCH6_R)
        with Locations((7.49889419, -8.594336225)):
            Circle(SKETCH6_R)
    extrude(amount=-CUT_CABLE_COVER_BOTTOM_DEPTH, mode=Mode.SUBTRACT)

    # Sketch7 → Cut Cable Cover Side (cut)
    with BuildSketch(Plane(origin=(-3.642059596, 0, 0), x_dir=(0, 0, -1), z_dir=(1, 0, 0))):
        with Locations(Location((8.594336225, 7.164945084, 0), (0, 0, 90))):
            Circle(SKETCH7_R)
        with Locations(Location((-34.199863775, 7.164945084, 0), (0, 0, 90))):
            Circle(SKETCH7_R)
    extrude(amount=-CUT_CABLE_COVER_SIDE_DEPTH, mode=Mode.SUBTRACT)

    # Sketch8 → Extrude Hinge (add)
    with BuildSketch(Plane.XZ.offset(10.085054916)):
        with Locations((55.107940404, -14.697236225)):
            Rectangle(SKETCH8_W, SKETCH8_H)
        with Locations((55.107940404, 20.302763775)):
            Rectangle(SKETCH8_W, SKETCH8_H)
    extrude(amount=EXTRUDE_HINGE_DEPTH)

    # Sketch9 → Cut Hinge Hole (cut, through all)
    with BuildSketch(Plane(origin=(0, 0, -19.697236225), x_dir=(-1, 0, 0), z_dir=(0, 0, -1))):
        with Locations((-55.107940404, -12.335054916)):
            Circle(SKETCH9_R)
    extrude(amount=-CUT_HINGE_HOLE_DEPTH, mode=Mode.SUBTRACT)

    # Fillet Hinge
    fillet_hinge_edges = [part.edges().sort_by_distance(p)[0] for p in [
        (56.857940404, -14.085054916, 20.302763775),
        (53.357940404, -14.085054916, 20.302763775),
        (56.857940404, -14.085054916, -14.697236225),
        (53.357940404, -14.085054916, -14.697236225),
    ]]
    fillet(fillet_hinge_edges, radius=FILLET_HINGE_R - 0.0001)  # a hair under: the kernel refuses the full size

    # Sketch10 → Cut Notch (cut)
    with BuildSketch(Plane(origin=(-3.642059596, 0, 0), x_dir=(0, 0, -1), z_dir=(1, 0, 0))):
        with Locations((-2.802763775, -2.585054916)):
            Rectangle(SKETCH10_W, SKETCH10_H)
    extrude(amount=-CUT_NOTCH_DEPTH, mode=Mode.SUBTRACT)

    # Sketch11 → Cut Side Notch (cut)
    with BuildSketch(Plane.XY.offset(-31.344336225)):
        with Locations((11.357940404, -2.585054916)):
            Rectangle(SKETCH11_W, SKETCH11_H)
    cut_side_notch = extrude(amount=-CUT_SIDE_NOTCH_DEPTH, mode=Mode.SUBTRACT)

    # Mirror Side Notch: Cut Side Notch across plane
    add(cut_side_notch.mirror(Plane(origin=(0, 0, 2.802763775), x_dir=(1, 0, 0), z_dir=(0, 0, -1))), mode=Mode.SUBTRACT)

    # Fillet Notch
    fillet_notch_edges = [part.edges().sort_by_distance(p)[0] for p in [
        (-5.142059596, -5.085054916, 2.802763775),
        (-5.142059596, -0.085054916, 2.802763775),
        (11.357940404, -5.085054916, -32.844336225),
        (11.357940404, -0.085054916, -32.844336225),
        (11.357940404, -5.085054916, 38.449863775),
        (11.357940404, -0.085054916, 38.449863775),
    ]]
    fillet(fillet_notch_edges, radius=FILLET_NOTCH_R - 0.0001)  # a hair under: the kernel refuses the full size


solid = part.part
